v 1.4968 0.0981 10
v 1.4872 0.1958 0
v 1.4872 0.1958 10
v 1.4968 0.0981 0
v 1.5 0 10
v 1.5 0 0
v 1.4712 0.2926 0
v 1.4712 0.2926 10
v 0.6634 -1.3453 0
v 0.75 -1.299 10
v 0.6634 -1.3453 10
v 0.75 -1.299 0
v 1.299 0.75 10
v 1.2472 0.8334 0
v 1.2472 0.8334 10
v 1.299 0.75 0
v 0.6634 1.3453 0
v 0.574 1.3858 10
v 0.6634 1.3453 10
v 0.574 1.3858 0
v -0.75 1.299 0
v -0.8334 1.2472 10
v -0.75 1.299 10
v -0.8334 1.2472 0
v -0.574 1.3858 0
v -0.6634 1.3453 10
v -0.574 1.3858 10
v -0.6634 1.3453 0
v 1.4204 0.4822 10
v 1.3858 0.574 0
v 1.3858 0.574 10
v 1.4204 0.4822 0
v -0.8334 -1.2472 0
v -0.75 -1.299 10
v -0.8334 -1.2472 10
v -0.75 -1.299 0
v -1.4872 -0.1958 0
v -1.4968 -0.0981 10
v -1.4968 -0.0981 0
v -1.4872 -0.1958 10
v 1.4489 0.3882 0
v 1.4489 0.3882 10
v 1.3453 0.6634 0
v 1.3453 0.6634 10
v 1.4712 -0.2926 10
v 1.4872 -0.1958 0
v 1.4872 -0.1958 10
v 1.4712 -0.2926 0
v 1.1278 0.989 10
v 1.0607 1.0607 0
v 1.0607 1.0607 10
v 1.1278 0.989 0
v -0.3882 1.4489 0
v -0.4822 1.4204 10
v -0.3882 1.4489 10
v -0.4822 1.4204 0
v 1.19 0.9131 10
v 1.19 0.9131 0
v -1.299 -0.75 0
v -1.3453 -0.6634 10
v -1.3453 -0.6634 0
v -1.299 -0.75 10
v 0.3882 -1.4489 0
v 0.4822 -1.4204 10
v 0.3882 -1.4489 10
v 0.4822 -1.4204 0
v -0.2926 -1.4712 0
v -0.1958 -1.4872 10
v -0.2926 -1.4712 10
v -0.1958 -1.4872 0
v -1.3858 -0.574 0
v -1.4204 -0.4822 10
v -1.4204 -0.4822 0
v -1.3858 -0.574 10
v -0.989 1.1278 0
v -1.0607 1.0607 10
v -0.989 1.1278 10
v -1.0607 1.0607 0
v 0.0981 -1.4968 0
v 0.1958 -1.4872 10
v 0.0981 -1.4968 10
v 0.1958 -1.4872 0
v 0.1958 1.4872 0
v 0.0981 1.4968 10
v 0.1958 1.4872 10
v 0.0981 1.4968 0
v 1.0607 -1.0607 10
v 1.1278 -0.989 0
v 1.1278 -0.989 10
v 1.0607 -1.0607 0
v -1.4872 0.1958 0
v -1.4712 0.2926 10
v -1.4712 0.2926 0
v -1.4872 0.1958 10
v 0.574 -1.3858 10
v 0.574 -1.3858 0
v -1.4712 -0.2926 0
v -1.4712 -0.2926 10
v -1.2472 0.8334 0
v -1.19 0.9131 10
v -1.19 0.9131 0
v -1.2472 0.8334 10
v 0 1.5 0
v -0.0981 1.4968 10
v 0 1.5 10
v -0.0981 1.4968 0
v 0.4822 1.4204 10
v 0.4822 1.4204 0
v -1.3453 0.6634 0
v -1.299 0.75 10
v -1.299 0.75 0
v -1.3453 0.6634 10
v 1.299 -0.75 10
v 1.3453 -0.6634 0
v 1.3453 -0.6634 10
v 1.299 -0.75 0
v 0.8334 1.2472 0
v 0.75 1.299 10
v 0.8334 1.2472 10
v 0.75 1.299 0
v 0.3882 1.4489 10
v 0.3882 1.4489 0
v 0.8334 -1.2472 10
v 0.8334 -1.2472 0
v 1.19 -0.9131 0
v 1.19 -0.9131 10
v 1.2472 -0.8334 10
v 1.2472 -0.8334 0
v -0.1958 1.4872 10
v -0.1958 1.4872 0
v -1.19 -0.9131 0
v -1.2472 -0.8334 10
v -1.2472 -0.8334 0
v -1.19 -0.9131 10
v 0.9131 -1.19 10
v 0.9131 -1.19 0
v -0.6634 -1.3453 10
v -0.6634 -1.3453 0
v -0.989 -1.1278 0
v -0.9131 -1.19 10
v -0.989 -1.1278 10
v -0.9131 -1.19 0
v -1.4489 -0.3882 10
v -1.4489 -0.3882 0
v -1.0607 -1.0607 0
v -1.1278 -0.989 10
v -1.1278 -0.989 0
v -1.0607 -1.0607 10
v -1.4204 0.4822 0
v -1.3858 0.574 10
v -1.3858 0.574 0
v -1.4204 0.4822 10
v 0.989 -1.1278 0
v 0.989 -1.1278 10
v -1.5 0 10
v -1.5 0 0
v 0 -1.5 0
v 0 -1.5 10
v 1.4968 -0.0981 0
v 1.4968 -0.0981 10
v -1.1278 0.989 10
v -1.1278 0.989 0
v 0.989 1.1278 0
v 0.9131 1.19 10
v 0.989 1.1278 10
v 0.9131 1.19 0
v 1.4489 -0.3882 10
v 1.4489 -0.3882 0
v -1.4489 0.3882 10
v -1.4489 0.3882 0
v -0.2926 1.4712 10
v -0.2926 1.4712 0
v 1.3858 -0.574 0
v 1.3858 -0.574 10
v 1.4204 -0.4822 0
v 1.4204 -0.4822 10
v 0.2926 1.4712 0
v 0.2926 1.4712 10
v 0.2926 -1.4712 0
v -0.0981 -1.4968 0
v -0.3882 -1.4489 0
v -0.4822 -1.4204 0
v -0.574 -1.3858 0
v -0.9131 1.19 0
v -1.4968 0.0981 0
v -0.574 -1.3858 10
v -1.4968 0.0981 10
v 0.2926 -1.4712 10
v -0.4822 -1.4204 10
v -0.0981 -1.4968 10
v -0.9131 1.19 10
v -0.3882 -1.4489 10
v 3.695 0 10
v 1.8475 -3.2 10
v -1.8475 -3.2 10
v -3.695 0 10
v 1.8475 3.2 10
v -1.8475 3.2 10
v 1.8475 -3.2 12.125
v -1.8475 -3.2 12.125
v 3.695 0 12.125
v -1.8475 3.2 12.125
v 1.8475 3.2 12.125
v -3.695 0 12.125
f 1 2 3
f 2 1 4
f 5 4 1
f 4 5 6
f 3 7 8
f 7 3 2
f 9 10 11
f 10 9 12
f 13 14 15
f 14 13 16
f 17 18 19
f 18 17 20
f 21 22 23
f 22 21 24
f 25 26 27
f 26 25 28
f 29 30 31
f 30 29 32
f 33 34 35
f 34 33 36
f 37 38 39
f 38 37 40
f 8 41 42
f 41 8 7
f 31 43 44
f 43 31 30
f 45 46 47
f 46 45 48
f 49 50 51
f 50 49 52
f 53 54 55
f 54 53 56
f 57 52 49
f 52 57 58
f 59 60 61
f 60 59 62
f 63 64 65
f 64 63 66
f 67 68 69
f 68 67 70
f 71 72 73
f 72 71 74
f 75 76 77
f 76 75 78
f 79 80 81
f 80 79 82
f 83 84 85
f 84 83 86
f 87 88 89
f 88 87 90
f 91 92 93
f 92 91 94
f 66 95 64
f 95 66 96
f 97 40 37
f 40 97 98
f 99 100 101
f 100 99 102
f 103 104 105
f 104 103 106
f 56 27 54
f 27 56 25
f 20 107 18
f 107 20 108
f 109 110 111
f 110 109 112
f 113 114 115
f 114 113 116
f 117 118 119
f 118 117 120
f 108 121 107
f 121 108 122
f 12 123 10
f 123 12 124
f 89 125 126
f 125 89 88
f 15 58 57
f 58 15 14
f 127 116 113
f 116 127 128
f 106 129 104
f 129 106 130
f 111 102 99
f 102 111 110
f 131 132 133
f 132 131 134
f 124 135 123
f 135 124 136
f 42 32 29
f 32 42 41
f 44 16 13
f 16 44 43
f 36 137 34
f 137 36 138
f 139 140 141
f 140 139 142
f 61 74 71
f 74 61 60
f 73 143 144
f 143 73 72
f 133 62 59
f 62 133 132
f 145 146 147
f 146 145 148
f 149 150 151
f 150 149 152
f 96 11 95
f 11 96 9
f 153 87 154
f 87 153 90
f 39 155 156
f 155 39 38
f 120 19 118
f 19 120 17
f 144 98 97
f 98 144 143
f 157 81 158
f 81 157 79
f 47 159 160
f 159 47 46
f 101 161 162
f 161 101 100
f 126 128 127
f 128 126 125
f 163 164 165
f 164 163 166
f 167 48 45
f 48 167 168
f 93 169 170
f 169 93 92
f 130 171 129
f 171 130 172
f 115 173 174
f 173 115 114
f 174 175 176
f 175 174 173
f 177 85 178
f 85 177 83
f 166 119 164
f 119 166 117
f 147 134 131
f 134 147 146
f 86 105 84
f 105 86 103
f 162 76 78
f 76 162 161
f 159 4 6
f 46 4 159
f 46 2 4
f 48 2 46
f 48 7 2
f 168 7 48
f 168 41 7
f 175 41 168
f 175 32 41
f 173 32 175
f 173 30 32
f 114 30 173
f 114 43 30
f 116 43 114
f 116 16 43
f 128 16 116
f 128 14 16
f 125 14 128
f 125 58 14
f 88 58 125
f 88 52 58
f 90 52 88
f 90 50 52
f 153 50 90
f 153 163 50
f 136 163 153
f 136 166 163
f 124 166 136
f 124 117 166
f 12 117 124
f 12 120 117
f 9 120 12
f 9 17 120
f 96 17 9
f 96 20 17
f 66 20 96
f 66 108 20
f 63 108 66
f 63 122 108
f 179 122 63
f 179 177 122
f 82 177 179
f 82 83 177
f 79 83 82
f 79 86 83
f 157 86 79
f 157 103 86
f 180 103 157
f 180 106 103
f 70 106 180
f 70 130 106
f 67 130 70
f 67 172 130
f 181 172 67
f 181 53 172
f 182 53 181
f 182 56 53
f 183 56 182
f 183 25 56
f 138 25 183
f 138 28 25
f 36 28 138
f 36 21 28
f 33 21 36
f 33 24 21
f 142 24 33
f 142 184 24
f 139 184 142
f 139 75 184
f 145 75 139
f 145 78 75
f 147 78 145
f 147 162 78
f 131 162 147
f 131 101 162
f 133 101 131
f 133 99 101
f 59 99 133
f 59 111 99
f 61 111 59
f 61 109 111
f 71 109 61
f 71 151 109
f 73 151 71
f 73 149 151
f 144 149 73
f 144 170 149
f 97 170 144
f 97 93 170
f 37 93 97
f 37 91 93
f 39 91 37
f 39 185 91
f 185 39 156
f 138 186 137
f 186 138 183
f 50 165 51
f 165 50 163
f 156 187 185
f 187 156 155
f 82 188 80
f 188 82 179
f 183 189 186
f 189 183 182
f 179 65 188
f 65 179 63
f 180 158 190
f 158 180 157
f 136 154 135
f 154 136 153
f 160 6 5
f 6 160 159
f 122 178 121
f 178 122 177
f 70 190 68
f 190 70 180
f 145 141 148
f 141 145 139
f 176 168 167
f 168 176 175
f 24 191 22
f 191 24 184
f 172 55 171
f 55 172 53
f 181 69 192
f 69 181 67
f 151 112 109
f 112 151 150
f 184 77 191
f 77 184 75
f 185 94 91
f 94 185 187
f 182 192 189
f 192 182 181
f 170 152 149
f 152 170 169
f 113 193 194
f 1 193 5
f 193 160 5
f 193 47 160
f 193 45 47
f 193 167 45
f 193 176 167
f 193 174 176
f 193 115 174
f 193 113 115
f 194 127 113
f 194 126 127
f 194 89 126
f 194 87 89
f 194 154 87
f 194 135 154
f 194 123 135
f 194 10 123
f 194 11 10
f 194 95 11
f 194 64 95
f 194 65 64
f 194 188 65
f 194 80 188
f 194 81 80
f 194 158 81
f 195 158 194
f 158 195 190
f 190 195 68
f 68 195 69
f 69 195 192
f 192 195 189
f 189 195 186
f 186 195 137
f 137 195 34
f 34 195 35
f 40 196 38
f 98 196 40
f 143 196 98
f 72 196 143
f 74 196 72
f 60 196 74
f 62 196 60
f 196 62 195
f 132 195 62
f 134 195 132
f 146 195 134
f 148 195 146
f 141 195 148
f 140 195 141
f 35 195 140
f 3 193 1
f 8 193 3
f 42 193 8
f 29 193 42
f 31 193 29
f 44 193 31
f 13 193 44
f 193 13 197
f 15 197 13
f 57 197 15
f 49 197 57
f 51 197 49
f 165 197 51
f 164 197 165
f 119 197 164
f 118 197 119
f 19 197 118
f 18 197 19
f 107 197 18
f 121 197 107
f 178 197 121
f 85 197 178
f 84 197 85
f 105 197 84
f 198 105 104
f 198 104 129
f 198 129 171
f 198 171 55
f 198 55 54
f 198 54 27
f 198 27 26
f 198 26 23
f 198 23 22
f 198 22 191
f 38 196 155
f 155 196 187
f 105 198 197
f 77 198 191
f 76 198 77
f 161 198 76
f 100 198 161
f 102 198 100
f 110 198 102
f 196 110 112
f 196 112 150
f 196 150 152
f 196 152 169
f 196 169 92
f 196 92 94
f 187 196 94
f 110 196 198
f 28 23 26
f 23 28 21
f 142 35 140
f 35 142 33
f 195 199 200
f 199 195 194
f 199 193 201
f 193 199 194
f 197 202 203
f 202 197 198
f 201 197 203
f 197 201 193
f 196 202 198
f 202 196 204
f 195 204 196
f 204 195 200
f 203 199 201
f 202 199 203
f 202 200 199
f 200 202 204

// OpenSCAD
$fn = 96;

shaft_d = 3.0;
length = 10.0;

head_flat_to_flat = 6.4;   // across flats
head_h = 2.125;

module hex_prism(flat_to_flat, h){
    // For a regular hexagon: across flats = 2*apothem = sqrt(3)*R (circumradius)
    R = flat_to_flat / sqrt(3);
    cylinder(h=h, r=R, $fn=6);
}

union() {
    // Shaft (under-head length)
    cylinder(h=length, d=shaft_d);

    // Hex head on top
    translate([0,0,length])
        hex_prism(head_flat_to_flat, head_h);
}
